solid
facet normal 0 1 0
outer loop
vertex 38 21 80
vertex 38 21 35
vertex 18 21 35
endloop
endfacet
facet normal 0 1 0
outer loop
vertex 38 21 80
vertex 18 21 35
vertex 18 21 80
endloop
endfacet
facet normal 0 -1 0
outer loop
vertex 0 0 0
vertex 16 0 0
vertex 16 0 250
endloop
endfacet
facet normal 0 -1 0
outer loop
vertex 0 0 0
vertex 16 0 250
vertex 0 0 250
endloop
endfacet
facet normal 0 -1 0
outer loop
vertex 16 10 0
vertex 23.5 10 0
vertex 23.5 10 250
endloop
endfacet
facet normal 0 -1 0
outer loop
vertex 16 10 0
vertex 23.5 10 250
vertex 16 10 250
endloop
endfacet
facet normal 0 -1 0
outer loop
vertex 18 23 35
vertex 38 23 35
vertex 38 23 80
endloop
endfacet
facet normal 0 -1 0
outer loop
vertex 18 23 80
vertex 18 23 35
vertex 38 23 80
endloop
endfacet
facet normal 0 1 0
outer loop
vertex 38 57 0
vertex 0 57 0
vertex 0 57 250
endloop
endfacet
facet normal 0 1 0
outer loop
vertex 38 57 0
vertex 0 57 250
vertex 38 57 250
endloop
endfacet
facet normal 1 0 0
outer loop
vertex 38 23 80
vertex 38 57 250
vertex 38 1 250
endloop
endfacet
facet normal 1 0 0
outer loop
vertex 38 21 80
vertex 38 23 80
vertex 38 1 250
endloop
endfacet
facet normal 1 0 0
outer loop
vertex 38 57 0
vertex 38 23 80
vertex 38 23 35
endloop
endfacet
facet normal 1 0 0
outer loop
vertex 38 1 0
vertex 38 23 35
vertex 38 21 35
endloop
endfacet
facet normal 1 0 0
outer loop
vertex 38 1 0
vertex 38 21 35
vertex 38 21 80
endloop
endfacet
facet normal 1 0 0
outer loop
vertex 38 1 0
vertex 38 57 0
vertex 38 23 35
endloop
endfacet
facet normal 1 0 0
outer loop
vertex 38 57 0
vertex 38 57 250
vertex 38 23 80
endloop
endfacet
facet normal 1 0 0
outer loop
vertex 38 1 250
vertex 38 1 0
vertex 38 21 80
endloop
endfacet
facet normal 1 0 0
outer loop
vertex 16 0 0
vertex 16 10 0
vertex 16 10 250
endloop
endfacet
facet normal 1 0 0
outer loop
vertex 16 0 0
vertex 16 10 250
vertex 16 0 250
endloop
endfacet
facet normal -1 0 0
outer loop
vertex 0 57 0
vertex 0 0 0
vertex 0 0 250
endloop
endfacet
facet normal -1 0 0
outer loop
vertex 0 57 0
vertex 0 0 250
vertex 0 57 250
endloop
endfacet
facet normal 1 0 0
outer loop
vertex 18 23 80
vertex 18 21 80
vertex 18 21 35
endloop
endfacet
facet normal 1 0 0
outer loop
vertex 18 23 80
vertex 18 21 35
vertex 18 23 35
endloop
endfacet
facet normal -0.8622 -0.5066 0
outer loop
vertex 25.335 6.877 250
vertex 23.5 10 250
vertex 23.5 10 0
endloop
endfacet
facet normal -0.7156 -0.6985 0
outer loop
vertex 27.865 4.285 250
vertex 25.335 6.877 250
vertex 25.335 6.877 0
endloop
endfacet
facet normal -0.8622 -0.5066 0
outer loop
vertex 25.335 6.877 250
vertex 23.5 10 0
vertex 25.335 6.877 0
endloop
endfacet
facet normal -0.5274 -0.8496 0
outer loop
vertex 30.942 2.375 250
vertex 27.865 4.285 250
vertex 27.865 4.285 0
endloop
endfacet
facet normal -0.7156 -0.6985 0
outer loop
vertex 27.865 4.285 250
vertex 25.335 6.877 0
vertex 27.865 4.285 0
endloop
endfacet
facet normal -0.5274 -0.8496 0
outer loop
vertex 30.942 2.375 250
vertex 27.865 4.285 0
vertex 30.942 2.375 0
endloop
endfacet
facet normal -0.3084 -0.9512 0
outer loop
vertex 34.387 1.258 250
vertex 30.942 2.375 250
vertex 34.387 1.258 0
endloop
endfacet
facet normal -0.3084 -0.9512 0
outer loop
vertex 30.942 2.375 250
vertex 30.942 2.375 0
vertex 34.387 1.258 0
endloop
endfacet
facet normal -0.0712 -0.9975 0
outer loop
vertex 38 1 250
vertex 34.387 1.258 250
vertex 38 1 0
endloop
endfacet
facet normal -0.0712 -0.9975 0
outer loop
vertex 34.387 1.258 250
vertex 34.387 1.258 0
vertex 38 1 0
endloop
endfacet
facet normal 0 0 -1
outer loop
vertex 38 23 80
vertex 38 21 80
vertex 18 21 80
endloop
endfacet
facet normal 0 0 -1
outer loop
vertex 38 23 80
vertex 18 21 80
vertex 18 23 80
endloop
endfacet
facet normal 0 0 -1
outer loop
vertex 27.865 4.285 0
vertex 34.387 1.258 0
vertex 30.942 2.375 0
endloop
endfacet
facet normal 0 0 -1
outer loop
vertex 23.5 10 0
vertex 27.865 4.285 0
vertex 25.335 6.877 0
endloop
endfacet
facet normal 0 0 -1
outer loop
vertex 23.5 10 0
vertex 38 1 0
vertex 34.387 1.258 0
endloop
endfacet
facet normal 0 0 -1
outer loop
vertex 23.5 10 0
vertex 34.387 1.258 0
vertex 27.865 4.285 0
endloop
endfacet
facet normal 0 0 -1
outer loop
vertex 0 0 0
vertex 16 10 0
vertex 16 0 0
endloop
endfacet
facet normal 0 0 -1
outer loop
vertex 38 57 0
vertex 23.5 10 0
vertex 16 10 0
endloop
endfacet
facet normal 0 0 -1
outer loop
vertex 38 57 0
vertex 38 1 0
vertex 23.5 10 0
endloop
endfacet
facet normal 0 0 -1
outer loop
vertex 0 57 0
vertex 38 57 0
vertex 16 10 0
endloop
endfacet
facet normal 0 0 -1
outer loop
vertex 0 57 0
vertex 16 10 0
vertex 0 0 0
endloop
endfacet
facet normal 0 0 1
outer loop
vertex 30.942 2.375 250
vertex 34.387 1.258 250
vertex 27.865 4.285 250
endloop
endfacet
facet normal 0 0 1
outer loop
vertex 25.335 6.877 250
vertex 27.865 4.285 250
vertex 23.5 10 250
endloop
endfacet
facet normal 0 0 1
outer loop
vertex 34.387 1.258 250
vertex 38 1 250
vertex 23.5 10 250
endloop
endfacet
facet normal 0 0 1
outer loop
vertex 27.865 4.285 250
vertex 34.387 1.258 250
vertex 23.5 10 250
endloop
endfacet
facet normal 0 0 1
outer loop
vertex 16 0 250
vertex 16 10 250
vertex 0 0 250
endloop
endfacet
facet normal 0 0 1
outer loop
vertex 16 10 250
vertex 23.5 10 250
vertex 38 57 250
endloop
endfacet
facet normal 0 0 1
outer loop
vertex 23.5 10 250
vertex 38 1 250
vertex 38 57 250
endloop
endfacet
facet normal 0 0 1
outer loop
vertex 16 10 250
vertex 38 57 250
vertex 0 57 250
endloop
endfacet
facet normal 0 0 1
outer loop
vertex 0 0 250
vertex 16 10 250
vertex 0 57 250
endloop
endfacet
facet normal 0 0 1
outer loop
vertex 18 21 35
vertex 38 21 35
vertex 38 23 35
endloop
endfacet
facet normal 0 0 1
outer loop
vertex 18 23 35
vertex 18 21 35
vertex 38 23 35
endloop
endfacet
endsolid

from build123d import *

# Parameters (mm, degrees)
PAD_DEPTH    = 250
SKETCH001_W  = 2
SKETCH001_H  = 45
POCKET_DEPTH = 20


with BuildPart() as part:
    # Sketch → Pad (new body)
    with BuildSketch(Plane.XY):
        with BuildLine():
            Line((0, 0), (0, 57))
            Line((0, 57), (38, 57))
            Line((38, 57), (38, 1))
            ThreePointArc((23.5, 10), (29.345332, 3.236924), (38, 1))
            Line((23.5, 10), (16, 10))
            Line((16, 10), (16, 0))
            Line((16, 0), (0, 0))
        make_face()
    extrude(amount=PAD_DEPTH)

    # Sketch001 (on Face3 of Pad) → Pocket (cut)
    with BuildSketch(Plane.YZ.offset(38)):
        with Locations((22, 57.5)):
            Rectangle(SKETCH001_W, SKETCH001_H)
    extrude(amount=-POCKET_DEPTH, mode=Mode.SUBTRACT)


solid = part.part
